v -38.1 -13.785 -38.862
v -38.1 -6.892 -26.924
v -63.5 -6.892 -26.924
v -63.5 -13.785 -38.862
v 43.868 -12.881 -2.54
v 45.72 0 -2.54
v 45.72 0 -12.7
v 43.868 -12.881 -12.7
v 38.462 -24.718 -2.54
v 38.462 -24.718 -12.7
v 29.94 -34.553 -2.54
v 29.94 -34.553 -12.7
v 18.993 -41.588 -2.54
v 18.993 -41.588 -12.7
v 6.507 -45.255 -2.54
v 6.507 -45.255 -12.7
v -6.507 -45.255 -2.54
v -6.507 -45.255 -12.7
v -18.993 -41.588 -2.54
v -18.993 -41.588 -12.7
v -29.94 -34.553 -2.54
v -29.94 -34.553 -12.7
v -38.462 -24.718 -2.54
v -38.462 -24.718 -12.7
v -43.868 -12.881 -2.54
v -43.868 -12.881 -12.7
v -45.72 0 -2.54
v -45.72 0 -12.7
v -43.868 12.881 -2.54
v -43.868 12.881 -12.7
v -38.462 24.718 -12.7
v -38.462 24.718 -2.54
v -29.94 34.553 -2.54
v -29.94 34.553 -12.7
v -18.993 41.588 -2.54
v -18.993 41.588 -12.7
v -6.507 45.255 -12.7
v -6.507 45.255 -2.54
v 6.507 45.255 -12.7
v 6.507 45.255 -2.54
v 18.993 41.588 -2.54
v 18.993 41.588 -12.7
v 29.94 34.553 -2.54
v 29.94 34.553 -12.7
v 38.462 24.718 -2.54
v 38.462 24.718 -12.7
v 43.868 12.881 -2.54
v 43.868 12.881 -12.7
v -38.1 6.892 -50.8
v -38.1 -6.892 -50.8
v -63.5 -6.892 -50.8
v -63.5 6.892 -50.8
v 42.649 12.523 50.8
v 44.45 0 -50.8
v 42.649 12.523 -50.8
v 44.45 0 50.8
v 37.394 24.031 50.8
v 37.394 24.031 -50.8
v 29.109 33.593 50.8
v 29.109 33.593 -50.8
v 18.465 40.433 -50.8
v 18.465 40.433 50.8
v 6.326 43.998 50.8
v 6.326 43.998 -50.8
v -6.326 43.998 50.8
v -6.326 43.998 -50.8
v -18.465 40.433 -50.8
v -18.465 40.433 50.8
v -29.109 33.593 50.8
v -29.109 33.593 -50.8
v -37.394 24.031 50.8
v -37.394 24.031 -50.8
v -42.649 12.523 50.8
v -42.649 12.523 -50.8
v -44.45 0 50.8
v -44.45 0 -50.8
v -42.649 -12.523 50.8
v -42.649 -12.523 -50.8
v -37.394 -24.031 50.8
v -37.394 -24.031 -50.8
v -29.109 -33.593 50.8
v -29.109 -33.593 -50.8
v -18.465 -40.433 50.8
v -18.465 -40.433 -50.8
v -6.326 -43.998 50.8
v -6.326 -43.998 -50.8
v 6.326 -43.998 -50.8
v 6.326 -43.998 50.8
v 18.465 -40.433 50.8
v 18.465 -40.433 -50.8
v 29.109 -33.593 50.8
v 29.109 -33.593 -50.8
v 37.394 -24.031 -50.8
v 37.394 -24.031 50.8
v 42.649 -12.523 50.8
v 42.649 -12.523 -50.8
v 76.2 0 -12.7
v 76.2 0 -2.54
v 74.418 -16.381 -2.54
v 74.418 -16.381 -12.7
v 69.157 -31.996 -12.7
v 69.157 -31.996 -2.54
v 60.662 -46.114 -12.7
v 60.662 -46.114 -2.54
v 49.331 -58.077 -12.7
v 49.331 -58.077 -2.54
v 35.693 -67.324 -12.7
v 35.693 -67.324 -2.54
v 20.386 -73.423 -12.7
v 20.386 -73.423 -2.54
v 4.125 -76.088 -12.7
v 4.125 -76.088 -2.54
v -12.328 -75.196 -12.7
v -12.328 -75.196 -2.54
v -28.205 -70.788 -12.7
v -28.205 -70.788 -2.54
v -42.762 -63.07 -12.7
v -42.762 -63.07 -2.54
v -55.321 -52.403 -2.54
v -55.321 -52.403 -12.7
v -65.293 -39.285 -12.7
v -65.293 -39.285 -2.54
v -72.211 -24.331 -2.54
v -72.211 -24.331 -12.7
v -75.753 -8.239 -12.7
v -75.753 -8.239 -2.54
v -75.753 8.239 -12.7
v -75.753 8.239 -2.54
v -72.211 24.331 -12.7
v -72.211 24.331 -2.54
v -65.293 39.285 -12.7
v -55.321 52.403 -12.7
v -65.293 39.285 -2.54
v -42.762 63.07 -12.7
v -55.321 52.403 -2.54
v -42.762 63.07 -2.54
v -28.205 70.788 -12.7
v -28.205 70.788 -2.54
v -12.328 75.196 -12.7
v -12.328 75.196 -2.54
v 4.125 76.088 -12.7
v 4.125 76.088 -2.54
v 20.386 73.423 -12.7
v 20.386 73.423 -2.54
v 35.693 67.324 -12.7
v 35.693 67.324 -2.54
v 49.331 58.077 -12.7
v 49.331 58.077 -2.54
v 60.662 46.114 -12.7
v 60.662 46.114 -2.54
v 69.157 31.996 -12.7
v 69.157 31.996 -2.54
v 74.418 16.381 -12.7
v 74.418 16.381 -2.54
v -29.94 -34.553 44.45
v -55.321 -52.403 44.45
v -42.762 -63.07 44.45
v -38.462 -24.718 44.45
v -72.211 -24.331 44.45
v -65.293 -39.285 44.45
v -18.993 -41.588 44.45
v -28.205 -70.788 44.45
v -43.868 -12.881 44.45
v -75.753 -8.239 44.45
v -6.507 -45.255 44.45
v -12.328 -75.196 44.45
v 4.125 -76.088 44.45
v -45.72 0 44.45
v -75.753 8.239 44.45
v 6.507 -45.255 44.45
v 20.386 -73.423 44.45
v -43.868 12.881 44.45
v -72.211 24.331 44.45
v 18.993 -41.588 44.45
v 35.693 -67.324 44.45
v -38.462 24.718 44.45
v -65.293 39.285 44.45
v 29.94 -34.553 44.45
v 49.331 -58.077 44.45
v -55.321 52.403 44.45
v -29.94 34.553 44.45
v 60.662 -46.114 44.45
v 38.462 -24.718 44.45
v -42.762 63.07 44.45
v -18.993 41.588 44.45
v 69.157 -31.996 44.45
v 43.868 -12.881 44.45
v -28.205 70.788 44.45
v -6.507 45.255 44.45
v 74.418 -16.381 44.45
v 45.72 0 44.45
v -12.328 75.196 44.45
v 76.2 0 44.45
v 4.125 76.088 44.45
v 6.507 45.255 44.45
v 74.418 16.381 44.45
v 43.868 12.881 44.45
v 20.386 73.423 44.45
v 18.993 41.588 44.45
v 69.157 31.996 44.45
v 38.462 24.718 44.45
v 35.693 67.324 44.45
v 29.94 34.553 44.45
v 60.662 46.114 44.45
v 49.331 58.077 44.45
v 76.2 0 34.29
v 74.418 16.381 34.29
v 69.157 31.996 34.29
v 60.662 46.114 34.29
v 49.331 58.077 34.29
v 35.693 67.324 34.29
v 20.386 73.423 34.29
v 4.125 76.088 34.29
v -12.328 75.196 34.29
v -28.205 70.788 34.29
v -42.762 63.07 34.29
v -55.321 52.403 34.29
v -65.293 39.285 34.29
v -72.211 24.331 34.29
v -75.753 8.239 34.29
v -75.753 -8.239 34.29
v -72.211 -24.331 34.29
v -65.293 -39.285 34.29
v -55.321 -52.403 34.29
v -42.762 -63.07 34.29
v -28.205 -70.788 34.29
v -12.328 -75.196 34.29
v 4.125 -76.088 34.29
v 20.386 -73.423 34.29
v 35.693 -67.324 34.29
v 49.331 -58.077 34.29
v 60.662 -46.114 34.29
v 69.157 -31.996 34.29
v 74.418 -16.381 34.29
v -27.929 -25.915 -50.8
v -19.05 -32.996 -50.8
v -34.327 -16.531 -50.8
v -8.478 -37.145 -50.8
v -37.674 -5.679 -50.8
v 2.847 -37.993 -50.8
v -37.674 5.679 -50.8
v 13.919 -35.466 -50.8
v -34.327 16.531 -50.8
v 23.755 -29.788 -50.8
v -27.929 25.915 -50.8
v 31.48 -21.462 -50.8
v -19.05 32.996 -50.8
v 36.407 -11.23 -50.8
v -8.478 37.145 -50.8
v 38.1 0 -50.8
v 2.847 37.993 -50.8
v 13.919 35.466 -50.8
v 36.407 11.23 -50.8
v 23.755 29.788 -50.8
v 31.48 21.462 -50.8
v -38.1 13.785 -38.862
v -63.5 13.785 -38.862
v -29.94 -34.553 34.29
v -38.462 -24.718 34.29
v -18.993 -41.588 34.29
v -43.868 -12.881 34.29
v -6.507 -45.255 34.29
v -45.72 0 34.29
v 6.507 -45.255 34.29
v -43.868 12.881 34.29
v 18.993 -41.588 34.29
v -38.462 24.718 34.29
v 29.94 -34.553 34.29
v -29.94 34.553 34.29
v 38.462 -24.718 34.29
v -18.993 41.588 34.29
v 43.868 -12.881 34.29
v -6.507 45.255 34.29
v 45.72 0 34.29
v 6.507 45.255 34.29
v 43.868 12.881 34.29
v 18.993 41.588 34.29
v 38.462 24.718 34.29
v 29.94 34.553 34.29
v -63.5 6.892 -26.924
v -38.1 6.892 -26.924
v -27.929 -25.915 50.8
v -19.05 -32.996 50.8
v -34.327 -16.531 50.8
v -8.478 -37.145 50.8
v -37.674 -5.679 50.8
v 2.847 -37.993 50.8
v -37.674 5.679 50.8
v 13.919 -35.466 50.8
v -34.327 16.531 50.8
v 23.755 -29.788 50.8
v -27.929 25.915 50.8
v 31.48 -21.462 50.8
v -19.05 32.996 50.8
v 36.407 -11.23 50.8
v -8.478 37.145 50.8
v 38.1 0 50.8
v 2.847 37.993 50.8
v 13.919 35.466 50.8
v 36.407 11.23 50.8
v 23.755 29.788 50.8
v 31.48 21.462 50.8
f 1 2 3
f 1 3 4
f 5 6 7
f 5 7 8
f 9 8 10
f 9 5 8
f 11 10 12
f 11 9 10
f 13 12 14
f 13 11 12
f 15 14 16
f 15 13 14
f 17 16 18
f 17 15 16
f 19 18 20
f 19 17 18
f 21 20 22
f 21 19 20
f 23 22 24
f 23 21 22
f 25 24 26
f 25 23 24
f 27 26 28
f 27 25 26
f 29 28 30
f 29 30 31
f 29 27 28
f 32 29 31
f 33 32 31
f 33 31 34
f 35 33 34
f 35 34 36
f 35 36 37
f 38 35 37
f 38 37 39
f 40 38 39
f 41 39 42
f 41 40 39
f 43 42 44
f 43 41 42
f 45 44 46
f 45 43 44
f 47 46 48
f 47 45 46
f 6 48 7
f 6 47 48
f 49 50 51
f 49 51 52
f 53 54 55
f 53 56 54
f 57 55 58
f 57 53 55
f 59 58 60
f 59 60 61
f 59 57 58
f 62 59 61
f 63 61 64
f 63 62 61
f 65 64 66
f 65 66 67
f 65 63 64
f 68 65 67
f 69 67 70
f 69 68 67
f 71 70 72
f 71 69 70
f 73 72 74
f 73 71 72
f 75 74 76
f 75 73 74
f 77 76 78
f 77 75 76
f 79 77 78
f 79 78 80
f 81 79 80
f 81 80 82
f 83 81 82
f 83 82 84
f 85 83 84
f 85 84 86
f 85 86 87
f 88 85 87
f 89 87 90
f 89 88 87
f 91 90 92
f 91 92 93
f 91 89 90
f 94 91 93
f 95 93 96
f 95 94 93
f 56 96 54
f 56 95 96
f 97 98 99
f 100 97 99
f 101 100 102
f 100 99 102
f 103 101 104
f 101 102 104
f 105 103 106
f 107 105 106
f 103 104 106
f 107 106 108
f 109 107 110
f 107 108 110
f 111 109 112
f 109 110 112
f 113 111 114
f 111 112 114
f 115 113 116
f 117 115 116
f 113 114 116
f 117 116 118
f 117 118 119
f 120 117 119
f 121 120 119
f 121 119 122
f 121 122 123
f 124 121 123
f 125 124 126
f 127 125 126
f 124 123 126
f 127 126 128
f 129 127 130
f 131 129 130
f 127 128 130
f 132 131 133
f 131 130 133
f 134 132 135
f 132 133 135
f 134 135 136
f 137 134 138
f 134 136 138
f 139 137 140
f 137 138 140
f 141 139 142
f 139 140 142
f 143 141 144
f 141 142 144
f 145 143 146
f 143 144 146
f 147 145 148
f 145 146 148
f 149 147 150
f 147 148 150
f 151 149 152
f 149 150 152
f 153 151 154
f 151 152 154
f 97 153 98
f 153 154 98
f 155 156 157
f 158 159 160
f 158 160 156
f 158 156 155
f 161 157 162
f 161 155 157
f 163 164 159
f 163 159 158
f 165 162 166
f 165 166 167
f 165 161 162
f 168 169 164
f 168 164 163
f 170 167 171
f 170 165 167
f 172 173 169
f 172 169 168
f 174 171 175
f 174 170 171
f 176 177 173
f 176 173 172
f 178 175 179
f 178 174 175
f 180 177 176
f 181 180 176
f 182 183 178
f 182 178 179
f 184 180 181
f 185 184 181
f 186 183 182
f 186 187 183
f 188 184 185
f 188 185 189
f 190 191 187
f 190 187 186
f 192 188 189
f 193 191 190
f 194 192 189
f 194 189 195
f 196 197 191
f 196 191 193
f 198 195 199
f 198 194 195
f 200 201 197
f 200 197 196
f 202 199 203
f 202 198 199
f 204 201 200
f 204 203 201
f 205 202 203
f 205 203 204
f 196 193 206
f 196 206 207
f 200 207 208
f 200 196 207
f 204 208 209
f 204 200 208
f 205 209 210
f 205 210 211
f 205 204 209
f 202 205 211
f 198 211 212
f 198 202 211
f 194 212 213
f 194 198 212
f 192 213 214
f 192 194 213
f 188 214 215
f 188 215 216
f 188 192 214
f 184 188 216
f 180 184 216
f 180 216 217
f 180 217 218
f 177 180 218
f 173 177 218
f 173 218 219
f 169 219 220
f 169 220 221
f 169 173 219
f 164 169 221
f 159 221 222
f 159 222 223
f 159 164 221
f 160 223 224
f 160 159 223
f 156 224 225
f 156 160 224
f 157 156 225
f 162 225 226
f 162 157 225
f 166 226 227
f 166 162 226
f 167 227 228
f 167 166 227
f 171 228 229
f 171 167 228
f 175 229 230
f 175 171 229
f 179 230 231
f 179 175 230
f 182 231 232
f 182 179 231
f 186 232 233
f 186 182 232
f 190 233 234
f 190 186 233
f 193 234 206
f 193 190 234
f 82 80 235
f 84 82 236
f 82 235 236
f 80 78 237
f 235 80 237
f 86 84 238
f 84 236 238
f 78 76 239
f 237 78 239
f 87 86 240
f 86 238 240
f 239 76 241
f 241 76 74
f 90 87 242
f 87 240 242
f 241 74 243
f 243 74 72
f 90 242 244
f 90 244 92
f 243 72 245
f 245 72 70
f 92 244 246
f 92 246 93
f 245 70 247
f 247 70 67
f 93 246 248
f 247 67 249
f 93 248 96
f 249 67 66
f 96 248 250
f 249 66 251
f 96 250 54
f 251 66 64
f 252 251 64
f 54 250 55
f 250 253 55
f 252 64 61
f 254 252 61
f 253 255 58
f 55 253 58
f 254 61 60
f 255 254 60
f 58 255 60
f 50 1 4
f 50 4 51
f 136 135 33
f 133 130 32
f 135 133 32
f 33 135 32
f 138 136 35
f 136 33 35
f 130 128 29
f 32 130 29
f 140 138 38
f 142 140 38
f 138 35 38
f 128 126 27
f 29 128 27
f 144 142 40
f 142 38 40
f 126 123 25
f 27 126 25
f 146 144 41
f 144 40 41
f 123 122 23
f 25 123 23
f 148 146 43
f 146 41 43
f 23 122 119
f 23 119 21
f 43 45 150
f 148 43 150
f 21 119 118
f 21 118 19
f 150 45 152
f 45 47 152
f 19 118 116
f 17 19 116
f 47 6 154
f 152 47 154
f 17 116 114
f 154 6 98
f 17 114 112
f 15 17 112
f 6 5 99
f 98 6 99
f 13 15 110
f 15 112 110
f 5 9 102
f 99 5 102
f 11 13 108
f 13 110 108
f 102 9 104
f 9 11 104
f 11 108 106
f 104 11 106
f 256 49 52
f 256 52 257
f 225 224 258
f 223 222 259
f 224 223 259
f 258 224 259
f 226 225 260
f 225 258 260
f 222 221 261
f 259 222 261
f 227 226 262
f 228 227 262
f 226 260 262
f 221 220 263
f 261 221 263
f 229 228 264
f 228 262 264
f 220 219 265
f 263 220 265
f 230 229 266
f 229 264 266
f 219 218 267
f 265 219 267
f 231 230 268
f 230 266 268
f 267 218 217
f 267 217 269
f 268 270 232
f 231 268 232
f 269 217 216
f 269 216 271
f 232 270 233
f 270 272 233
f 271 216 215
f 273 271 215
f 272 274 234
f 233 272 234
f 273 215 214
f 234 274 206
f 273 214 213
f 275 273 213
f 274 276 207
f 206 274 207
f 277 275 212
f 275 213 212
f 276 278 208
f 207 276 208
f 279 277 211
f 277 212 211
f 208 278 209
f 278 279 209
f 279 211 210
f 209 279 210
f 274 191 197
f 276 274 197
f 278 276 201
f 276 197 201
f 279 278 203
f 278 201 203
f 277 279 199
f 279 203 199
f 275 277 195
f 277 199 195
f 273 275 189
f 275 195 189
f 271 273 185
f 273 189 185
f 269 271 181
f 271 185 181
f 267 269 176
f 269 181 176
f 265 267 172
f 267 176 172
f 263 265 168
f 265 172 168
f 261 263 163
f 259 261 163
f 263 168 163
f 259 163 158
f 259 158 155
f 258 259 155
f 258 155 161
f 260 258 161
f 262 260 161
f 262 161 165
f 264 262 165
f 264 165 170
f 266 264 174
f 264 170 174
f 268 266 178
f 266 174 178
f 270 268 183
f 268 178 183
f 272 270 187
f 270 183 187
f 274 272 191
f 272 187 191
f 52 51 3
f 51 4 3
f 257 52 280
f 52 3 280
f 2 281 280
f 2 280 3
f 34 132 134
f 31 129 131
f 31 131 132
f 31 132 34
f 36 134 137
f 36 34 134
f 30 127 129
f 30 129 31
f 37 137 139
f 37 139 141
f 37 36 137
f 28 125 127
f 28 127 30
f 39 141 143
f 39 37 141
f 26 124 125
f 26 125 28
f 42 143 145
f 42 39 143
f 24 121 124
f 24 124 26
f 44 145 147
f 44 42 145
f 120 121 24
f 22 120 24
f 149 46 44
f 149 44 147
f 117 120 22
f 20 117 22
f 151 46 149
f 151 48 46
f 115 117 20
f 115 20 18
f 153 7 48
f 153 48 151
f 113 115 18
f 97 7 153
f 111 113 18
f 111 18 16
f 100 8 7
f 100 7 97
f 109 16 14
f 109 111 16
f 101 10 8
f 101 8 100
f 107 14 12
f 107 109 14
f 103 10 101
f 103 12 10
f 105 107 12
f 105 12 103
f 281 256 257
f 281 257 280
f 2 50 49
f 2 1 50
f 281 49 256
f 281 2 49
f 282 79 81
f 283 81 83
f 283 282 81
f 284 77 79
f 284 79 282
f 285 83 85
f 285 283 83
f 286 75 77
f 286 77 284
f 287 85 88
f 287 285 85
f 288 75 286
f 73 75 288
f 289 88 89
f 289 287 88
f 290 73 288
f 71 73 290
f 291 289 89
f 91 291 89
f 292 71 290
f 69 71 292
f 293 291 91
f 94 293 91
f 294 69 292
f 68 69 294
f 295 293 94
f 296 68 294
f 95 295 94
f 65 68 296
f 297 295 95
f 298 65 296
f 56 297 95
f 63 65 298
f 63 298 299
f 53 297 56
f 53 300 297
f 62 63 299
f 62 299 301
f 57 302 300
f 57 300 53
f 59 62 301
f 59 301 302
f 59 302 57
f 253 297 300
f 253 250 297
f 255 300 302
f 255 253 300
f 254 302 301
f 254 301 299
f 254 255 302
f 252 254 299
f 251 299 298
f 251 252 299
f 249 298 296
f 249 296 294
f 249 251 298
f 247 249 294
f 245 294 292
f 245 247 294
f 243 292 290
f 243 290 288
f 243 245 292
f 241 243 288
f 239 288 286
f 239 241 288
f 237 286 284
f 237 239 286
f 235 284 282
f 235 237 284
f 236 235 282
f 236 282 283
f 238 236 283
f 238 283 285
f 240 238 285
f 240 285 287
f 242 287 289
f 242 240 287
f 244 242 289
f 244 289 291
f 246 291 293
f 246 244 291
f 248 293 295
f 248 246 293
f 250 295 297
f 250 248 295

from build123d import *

# Parameters (mm, degrees)
F0_R     = 44.45
F0_R_2   = 38.1
F1_DEPTH = 50.8
F3_R     = 76.2
F3_R_2   = 45.72
F4_DEPTH = 10.16
F6_R     = 76.2
F6_R_2   = 45.72
F7_DEPTH = 10.16
F9_START = -38.1
F9_DEPTH = 25.4


with BuildPart() as f1:
    # F0 (on Top) → F1 (new body, symmetric)
    with BuildSketch(Plane.XY):
        Circle(F0_R)
        Circle(F0_R_2, mode=Mode.SUBTRACT)
    extrude(amount=F1_DEPTH, both=True)


with BuildPart() as f4:
    # F3 (on offset) → F4 (new body)
    with BuildSketch(Plane.XY.offset(44.45)):
        Circle(F3_R)
        Circle(F3_R_2, mode=Mode.SUBTRACT)
    extrude(amount=-F4_DEPTH)


with BuildPart() as f7:
    # F6 (on offset) → F7 (new body)
    with BuildSketch(Plane(origin=(0, 0, -2.54), x_dir=(1, 0, 0), z_dir=(0, 0, -1))):
        Circle(F6_R)
        Circle(F6_R_2, mode=Mode.SUBTRACT)
    extrude(amount=F7_DEPTH)


with BuildPart() as f9:
    # F8 (on Right) → F9 (new body)
    with BuildSketch(Plane.YZ.offset(F9_START)):
        Polygon((-6.8924075136, -50.8), (6.8924075136, -50.8), (13.7848150272, -38.862), (6.8924075136, -26.924), (-6.8924075136, -26.924), (-13.7848150272, -38.862), align=None)
    extrude(amount=-F9_DEPTH)


solid = Compound([f1.part, f4.part, f7.part, f9.part])
